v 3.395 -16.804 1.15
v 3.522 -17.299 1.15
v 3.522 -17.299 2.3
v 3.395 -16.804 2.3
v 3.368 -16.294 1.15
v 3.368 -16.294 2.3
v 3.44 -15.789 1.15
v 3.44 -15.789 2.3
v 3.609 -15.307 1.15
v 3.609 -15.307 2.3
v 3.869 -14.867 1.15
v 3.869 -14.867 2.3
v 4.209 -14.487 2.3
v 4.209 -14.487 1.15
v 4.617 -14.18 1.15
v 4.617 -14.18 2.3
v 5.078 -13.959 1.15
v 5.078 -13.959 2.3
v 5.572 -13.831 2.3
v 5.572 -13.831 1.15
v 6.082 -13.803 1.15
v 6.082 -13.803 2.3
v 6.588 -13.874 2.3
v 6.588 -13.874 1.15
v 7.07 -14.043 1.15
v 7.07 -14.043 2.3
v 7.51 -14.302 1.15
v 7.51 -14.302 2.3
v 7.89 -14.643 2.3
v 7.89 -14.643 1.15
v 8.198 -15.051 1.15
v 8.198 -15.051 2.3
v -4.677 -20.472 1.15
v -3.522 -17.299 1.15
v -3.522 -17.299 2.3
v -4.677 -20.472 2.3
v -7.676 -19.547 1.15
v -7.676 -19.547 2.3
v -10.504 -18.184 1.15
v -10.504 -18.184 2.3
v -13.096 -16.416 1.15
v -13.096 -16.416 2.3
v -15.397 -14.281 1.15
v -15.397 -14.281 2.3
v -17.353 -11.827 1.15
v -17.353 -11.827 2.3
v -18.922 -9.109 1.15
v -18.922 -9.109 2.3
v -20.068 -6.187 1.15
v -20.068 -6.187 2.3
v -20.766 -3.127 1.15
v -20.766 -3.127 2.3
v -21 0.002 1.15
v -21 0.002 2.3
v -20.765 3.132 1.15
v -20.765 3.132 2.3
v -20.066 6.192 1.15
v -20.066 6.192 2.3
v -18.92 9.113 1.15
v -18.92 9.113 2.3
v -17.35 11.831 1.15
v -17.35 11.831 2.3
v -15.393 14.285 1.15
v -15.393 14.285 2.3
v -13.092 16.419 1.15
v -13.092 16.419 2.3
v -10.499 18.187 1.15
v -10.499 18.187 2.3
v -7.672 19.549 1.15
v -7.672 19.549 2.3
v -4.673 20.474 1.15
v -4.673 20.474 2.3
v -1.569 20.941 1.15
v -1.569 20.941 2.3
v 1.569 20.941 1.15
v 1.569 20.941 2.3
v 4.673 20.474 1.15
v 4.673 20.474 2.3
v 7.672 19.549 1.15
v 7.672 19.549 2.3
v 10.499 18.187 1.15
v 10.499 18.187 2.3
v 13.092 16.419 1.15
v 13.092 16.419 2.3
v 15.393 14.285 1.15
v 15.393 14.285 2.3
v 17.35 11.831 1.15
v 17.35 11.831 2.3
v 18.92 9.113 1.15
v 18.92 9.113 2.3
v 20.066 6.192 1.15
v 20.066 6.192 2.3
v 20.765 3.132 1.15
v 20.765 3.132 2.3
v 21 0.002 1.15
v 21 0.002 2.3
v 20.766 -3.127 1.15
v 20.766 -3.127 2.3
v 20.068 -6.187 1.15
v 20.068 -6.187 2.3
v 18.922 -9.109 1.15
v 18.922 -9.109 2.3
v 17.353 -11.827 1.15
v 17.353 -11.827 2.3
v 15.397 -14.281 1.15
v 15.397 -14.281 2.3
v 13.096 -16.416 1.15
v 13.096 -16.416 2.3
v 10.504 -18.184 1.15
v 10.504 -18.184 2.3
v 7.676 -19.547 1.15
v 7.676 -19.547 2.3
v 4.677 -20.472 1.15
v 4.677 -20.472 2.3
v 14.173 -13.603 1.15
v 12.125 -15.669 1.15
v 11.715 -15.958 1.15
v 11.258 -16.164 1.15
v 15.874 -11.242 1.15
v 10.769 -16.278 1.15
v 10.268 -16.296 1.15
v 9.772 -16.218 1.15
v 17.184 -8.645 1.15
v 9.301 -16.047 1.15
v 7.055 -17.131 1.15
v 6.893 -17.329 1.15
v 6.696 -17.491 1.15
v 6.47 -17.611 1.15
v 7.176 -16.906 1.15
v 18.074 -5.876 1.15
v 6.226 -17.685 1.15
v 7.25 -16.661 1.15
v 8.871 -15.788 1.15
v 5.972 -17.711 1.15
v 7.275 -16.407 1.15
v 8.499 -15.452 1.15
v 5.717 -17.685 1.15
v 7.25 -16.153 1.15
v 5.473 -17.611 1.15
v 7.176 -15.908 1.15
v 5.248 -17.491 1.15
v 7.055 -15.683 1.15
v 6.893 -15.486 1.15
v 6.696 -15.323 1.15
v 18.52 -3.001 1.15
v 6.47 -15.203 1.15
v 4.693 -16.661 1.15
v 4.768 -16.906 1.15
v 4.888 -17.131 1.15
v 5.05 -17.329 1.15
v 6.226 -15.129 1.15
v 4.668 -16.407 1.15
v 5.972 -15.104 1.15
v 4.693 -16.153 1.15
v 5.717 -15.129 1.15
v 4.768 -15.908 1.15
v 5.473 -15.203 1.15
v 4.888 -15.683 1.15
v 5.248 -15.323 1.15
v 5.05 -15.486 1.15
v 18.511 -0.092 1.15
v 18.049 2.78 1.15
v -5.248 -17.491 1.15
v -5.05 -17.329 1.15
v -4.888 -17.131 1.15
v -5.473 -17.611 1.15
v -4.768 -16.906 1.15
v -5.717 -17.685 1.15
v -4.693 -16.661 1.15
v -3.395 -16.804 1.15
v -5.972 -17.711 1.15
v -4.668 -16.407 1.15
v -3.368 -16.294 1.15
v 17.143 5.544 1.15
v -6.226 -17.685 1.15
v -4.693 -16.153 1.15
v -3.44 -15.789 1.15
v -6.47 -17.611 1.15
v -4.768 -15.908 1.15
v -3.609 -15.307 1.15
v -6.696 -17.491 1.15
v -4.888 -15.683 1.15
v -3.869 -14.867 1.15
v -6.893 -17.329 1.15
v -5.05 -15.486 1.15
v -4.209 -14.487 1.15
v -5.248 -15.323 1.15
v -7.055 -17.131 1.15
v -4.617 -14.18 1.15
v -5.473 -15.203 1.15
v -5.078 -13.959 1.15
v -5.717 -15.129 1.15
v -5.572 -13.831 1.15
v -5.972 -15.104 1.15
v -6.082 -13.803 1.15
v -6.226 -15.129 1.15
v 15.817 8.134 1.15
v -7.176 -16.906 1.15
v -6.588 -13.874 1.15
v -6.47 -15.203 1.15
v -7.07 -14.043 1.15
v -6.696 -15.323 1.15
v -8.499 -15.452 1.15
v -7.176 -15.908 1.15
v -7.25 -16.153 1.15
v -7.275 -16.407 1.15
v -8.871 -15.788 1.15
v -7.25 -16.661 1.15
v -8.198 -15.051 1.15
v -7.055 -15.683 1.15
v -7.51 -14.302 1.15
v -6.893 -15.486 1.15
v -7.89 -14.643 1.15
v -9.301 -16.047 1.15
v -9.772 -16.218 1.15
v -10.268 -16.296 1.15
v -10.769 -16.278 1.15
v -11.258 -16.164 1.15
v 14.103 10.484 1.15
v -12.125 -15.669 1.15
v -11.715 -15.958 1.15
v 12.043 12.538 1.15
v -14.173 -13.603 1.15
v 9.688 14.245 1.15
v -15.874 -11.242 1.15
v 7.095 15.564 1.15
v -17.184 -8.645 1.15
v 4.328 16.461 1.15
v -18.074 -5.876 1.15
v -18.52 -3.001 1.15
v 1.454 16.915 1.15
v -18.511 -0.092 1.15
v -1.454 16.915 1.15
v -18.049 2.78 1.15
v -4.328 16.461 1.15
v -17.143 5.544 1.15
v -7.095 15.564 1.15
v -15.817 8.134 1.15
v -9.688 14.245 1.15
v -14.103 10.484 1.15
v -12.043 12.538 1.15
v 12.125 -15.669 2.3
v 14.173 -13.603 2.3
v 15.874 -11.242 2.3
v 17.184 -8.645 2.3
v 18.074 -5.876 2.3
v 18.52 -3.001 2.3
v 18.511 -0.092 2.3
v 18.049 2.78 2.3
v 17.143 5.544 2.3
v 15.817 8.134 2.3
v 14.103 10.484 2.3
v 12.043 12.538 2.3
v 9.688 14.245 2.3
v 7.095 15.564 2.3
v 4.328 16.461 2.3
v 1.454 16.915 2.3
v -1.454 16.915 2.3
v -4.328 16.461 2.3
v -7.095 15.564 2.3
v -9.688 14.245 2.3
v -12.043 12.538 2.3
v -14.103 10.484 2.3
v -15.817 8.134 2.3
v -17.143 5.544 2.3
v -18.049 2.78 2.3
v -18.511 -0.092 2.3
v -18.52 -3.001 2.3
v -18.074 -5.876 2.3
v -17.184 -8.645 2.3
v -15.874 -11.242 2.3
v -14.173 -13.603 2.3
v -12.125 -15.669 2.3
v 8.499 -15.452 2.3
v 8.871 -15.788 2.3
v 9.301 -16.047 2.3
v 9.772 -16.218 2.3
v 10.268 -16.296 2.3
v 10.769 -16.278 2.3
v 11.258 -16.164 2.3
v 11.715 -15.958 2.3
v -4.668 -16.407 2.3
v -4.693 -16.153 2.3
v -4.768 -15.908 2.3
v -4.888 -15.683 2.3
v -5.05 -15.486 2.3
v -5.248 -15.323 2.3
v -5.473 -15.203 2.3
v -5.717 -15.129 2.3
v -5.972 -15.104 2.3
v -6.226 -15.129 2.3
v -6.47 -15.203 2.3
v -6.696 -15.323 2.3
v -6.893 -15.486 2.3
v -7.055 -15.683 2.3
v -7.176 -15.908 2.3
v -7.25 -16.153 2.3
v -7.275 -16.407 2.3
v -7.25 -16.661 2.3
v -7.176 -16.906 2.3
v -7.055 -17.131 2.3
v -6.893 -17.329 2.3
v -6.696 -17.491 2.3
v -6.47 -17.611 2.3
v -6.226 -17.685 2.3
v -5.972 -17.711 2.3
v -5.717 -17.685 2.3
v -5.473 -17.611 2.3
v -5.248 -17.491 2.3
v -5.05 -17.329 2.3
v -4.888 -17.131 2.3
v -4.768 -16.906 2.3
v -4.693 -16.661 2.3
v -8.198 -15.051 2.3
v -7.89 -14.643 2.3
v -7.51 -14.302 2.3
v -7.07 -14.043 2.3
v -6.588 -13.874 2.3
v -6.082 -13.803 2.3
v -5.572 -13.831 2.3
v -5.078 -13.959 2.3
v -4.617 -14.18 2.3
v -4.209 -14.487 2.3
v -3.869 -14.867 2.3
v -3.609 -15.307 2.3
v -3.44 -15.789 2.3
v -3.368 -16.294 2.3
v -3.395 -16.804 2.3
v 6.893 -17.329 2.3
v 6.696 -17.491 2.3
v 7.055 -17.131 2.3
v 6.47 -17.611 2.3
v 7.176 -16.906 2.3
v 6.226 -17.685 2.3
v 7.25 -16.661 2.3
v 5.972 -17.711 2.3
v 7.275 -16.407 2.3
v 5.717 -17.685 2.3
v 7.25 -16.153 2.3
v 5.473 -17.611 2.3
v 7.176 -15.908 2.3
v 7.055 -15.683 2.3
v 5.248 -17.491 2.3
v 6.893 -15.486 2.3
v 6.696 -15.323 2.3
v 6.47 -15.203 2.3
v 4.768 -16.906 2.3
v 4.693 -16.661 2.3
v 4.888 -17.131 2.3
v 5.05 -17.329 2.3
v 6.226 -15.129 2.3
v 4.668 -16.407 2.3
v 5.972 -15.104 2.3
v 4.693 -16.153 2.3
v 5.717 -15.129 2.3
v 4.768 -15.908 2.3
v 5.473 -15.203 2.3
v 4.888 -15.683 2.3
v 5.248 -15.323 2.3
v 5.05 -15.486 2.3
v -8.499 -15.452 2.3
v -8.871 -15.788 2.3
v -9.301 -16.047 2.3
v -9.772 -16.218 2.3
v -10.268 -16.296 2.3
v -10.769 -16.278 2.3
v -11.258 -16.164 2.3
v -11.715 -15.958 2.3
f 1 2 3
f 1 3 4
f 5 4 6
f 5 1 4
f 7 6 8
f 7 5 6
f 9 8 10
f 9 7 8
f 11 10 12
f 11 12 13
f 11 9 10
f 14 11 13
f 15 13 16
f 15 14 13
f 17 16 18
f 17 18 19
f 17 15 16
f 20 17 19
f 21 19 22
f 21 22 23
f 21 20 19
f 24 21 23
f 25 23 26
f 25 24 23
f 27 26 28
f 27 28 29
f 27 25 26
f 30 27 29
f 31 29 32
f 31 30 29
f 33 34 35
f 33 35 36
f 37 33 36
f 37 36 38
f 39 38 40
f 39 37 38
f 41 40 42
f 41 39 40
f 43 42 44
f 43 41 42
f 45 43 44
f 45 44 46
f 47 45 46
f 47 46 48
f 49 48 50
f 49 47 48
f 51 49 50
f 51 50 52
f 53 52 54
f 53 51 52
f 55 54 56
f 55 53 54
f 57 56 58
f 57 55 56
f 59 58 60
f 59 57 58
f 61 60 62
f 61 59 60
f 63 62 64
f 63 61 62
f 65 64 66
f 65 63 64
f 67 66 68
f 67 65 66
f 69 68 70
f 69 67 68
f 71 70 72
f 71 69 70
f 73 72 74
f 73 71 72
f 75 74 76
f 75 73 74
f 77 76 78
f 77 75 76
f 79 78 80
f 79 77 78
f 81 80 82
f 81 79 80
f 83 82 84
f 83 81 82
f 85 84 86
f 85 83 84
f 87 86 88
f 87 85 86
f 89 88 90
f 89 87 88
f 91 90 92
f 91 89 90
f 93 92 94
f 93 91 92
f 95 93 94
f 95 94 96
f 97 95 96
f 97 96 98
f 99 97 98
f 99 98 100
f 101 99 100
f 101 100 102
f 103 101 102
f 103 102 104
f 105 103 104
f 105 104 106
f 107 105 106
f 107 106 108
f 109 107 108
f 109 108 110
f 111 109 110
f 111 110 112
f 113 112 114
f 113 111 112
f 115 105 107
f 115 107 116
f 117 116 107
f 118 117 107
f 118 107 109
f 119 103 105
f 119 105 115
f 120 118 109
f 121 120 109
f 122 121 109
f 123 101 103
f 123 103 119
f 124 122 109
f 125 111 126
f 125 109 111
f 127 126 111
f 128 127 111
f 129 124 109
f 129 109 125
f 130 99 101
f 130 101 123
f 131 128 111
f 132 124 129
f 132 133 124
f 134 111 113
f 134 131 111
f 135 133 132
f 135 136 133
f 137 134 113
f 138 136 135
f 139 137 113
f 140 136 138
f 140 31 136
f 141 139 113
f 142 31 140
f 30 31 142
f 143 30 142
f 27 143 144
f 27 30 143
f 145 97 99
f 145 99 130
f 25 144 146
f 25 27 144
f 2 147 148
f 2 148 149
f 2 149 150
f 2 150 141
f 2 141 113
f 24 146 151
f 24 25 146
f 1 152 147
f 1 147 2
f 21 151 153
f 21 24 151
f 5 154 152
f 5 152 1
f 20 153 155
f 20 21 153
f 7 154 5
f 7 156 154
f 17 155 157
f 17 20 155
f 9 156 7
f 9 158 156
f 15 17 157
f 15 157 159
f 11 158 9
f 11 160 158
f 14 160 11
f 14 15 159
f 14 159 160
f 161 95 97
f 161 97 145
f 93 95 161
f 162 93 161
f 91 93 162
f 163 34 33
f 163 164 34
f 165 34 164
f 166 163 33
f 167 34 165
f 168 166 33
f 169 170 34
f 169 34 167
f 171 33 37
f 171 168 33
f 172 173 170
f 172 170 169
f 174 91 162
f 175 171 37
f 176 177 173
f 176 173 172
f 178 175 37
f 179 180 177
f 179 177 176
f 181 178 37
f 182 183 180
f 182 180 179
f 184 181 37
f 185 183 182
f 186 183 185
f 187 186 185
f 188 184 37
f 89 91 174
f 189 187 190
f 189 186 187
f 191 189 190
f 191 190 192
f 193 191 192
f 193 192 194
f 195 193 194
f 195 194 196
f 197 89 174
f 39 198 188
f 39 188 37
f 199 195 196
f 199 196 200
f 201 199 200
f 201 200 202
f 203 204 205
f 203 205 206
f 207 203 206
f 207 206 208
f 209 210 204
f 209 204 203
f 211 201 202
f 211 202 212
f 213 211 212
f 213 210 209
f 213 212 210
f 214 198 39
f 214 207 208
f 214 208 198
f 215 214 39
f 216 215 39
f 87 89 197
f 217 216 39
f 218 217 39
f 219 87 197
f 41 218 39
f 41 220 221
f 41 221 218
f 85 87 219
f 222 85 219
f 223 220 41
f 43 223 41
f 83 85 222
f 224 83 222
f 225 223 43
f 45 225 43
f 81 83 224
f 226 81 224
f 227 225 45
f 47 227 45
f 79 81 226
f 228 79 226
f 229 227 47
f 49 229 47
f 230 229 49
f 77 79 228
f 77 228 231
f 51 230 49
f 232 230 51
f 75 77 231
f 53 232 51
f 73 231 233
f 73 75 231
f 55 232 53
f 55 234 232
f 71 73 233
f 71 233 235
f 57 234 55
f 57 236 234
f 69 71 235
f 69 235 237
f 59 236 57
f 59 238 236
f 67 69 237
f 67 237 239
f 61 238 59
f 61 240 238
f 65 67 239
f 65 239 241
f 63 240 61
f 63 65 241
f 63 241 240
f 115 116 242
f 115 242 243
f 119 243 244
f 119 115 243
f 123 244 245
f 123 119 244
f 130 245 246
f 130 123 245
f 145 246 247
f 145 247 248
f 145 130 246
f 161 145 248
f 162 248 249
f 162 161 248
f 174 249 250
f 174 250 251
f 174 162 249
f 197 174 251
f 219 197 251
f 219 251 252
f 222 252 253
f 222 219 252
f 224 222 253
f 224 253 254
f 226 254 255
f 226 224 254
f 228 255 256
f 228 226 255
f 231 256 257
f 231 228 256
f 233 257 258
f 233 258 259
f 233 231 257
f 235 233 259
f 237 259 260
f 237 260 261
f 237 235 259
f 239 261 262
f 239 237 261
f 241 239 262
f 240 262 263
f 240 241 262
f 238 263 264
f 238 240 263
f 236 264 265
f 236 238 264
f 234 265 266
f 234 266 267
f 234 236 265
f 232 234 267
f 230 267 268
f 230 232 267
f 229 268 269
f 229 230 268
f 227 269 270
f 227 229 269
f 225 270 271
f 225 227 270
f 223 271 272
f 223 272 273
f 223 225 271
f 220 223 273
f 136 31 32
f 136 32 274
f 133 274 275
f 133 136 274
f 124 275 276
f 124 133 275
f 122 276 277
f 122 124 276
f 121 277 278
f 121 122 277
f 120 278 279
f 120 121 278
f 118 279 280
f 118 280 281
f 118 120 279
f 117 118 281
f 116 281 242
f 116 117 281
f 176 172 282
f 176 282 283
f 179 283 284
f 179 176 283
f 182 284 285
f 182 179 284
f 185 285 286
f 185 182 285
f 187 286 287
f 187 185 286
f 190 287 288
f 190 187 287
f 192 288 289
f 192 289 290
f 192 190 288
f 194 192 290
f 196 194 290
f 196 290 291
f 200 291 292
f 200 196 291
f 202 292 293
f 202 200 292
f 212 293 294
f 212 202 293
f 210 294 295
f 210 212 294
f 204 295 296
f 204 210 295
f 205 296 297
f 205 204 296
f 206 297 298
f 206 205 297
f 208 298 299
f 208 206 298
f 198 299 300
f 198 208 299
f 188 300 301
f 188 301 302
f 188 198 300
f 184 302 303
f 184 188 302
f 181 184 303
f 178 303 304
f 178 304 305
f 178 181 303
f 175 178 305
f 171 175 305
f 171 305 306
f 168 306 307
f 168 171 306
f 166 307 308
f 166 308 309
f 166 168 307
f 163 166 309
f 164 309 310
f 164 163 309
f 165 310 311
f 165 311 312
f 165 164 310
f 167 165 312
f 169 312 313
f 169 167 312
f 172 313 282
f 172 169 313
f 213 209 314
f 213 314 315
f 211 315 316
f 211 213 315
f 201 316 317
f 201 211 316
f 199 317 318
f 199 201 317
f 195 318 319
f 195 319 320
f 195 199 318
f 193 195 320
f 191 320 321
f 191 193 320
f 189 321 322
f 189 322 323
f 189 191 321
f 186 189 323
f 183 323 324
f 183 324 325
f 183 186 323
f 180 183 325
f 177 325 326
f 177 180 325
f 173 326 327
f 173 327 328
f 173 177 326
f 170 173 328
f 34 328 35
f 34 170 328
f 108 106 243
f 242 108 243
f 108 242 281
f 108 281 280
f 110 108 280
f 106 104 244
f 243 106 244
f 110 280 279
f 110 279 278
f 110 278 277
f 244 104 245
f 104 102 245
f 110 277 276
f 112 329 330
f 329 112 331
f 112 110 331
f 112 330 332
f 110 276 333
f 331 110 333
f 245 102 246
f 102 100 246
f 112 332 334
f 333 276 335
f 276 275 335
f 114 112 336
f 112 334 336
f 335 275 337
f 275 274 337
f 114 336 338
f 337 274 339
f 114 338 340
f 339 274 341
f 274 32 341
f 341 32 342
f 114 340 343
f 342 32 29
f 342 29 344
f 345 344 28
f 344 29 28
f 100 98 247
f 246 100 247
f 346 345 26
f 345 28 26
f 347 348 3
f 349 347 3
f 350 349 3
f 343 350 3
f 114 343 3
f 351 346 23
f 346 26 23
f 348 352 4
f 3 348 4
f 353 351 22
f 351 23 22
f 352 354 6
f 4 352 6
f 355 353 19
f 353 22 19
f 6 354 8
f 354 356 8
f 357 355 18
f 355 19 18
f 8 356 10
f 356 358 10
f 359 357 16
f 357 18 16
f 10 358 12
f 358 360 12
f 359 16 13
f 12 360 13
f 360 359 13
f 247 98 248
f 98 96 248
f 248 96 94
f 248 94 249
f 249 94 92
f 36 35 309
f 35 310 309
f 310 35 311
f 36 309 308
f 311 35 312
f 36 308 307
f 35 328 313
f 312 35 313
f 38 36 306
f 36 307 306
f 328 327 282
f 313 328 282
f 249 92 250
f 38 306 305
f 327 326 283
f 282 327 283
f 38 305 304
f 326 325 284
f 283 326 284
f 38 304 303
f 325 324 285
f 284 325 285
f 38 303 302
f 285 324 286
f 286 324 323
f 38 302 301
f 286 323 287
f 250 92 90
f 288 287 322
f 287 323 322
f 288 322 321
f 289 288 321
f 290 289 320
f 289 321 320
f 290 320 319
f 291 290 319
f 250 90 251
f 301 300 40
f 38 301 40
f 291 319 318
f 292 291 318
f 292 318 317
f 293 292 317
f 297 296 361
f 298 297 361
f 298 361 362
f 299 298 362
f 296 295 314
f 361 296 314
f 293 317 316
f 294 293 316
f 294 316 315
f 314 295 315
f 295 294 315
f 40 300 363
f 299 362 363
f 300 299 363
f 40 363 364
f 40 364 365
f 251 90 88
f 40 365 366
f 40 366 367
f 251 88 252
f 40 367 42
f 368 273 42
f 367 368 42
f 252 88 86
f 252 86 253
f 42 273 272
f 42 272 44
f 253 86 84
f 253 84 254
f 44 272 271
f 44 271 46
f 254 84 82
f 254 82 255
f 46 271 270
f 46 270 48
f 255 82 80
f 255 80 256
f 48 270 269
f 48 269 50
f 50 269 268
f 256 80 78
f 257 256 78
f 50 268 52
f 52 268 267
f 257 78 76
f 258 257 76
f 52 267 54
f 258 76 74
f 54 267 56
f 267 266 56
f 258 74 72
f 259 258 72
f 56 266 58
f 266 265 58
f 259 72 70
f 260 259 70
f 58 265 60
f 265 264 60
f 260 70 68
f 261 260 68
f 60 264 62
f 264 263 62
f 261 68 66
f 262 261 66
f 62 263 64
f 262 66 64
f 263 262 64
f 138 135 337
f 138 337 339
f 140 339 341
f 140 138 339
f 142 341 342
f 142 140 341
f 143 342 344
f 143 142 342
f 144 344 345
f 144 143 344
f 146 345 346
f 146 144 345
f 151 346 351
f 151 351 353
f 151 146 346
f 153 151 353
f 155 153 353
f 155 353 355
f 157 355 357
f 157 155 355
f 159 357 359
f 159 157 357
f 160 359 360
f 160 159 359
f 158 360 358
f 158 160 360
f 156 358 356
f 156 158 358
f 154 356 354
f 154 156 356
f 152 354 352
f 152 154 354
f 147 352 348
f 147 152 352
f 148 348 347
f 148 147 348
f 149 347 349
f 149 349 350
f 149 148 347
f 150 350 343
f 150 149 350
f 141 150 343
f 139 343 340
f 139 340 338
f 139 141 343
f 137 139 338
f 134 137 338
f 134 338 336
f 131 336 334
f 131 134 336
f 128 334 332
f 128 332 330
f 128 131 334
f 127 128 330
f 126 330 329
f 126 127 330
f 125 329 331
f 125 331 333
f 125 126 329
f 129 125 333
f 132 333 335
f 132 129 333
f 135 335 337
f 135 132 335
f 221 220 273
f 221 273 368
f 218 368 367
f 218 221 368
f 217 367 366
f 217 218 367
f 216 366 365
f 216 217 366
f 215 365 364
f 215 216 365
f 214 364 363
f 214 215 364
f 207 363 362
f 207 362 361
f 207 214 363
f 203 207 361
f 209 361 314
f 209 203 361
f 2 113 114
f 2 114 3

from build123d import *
from build123d.topology import SkipClean

# Parameters (mm, degrees)
SKETCH1_R                 = 21
EXTRUDE1_DEPTH            = 1.15
SKETCH34_R                = 1.303333333
F_056_250_SNAP_RING_DEPTH = 1.15
SKETCH35_R                = 21
CUT_EXTRUDE1_DEPTH        = 1.15


with BuildPart() as part:
    # Sketch1 → Extrude1 (new body)
    with BuildSketch(Plane.XY):
        Circle(SKETCH1_R)
    extrude(amount=EXTRUDE1_DEPTH)

    # Sketch34 → 056-250 Snap Ring (add)
    with SkipClean():  # the faces are left unmerged after this step: merging them gives an invalid solid
        with BuildSketch(Plane.XY.offset(1.15)):
            with BuildLine():
                Line((-3.522256245, -17.298702968), (-4.677411169, -20.472465039))
                ThreePointArc((-4.677411169, -20.472465039), (0, 21), (4.677411169, -20.472465039))
                Line((4.677411169, -20.472465039), (3.522256245, -17.298702968))
                ThreePointArc((3.522256245, -17.298702968), (4.842117839, -14.057977774), (8.197569602, -15.050589419))
                ThreePointArc((8.197569602, -15.050589419), (10.018304079, -16.269002398), (12.125199981, -15.668507704))
                ThreePointArc((12.125199981, -15.668507704), (0, 16.9723), (-12.125199981, -15.668507704))
                ThreePointArc((-12.125199981, -15.668507704), (-10.018304079, -16.269002398), (-8.197569602, -15.050589419))
                ThreePointArc((-8.197569602, -15.050589419), (-4.842117839, -14.057977774), (-3.522256245, -17.298702968))
            make_face()
            with Locations((5.971721676, -16.407170461)):
                Circle(SKETCH34_R, mode=Mode.SUBTRACT)
            with Locations((-5.971721676, -16.407170461)):
                Circle(SKETCH34_R, mode=Mode.SUBTRACT)
        extrude(amount=F_056_250_SNAP_RING_DEPTH)

    # Sketch35 → Cut-Extrude1 (cut)
    with BuildSketch(Plane(origin=(0, 0, 0), x_dir=(-1, 0, 0), z_dir=(0, 0, -1))):
        Circle(SKETCH35_R)
    extrude(amount=-CUT_EXTRUDE1_DEPTH, mode=Mode.SUBTRACT)


solid = part.part
